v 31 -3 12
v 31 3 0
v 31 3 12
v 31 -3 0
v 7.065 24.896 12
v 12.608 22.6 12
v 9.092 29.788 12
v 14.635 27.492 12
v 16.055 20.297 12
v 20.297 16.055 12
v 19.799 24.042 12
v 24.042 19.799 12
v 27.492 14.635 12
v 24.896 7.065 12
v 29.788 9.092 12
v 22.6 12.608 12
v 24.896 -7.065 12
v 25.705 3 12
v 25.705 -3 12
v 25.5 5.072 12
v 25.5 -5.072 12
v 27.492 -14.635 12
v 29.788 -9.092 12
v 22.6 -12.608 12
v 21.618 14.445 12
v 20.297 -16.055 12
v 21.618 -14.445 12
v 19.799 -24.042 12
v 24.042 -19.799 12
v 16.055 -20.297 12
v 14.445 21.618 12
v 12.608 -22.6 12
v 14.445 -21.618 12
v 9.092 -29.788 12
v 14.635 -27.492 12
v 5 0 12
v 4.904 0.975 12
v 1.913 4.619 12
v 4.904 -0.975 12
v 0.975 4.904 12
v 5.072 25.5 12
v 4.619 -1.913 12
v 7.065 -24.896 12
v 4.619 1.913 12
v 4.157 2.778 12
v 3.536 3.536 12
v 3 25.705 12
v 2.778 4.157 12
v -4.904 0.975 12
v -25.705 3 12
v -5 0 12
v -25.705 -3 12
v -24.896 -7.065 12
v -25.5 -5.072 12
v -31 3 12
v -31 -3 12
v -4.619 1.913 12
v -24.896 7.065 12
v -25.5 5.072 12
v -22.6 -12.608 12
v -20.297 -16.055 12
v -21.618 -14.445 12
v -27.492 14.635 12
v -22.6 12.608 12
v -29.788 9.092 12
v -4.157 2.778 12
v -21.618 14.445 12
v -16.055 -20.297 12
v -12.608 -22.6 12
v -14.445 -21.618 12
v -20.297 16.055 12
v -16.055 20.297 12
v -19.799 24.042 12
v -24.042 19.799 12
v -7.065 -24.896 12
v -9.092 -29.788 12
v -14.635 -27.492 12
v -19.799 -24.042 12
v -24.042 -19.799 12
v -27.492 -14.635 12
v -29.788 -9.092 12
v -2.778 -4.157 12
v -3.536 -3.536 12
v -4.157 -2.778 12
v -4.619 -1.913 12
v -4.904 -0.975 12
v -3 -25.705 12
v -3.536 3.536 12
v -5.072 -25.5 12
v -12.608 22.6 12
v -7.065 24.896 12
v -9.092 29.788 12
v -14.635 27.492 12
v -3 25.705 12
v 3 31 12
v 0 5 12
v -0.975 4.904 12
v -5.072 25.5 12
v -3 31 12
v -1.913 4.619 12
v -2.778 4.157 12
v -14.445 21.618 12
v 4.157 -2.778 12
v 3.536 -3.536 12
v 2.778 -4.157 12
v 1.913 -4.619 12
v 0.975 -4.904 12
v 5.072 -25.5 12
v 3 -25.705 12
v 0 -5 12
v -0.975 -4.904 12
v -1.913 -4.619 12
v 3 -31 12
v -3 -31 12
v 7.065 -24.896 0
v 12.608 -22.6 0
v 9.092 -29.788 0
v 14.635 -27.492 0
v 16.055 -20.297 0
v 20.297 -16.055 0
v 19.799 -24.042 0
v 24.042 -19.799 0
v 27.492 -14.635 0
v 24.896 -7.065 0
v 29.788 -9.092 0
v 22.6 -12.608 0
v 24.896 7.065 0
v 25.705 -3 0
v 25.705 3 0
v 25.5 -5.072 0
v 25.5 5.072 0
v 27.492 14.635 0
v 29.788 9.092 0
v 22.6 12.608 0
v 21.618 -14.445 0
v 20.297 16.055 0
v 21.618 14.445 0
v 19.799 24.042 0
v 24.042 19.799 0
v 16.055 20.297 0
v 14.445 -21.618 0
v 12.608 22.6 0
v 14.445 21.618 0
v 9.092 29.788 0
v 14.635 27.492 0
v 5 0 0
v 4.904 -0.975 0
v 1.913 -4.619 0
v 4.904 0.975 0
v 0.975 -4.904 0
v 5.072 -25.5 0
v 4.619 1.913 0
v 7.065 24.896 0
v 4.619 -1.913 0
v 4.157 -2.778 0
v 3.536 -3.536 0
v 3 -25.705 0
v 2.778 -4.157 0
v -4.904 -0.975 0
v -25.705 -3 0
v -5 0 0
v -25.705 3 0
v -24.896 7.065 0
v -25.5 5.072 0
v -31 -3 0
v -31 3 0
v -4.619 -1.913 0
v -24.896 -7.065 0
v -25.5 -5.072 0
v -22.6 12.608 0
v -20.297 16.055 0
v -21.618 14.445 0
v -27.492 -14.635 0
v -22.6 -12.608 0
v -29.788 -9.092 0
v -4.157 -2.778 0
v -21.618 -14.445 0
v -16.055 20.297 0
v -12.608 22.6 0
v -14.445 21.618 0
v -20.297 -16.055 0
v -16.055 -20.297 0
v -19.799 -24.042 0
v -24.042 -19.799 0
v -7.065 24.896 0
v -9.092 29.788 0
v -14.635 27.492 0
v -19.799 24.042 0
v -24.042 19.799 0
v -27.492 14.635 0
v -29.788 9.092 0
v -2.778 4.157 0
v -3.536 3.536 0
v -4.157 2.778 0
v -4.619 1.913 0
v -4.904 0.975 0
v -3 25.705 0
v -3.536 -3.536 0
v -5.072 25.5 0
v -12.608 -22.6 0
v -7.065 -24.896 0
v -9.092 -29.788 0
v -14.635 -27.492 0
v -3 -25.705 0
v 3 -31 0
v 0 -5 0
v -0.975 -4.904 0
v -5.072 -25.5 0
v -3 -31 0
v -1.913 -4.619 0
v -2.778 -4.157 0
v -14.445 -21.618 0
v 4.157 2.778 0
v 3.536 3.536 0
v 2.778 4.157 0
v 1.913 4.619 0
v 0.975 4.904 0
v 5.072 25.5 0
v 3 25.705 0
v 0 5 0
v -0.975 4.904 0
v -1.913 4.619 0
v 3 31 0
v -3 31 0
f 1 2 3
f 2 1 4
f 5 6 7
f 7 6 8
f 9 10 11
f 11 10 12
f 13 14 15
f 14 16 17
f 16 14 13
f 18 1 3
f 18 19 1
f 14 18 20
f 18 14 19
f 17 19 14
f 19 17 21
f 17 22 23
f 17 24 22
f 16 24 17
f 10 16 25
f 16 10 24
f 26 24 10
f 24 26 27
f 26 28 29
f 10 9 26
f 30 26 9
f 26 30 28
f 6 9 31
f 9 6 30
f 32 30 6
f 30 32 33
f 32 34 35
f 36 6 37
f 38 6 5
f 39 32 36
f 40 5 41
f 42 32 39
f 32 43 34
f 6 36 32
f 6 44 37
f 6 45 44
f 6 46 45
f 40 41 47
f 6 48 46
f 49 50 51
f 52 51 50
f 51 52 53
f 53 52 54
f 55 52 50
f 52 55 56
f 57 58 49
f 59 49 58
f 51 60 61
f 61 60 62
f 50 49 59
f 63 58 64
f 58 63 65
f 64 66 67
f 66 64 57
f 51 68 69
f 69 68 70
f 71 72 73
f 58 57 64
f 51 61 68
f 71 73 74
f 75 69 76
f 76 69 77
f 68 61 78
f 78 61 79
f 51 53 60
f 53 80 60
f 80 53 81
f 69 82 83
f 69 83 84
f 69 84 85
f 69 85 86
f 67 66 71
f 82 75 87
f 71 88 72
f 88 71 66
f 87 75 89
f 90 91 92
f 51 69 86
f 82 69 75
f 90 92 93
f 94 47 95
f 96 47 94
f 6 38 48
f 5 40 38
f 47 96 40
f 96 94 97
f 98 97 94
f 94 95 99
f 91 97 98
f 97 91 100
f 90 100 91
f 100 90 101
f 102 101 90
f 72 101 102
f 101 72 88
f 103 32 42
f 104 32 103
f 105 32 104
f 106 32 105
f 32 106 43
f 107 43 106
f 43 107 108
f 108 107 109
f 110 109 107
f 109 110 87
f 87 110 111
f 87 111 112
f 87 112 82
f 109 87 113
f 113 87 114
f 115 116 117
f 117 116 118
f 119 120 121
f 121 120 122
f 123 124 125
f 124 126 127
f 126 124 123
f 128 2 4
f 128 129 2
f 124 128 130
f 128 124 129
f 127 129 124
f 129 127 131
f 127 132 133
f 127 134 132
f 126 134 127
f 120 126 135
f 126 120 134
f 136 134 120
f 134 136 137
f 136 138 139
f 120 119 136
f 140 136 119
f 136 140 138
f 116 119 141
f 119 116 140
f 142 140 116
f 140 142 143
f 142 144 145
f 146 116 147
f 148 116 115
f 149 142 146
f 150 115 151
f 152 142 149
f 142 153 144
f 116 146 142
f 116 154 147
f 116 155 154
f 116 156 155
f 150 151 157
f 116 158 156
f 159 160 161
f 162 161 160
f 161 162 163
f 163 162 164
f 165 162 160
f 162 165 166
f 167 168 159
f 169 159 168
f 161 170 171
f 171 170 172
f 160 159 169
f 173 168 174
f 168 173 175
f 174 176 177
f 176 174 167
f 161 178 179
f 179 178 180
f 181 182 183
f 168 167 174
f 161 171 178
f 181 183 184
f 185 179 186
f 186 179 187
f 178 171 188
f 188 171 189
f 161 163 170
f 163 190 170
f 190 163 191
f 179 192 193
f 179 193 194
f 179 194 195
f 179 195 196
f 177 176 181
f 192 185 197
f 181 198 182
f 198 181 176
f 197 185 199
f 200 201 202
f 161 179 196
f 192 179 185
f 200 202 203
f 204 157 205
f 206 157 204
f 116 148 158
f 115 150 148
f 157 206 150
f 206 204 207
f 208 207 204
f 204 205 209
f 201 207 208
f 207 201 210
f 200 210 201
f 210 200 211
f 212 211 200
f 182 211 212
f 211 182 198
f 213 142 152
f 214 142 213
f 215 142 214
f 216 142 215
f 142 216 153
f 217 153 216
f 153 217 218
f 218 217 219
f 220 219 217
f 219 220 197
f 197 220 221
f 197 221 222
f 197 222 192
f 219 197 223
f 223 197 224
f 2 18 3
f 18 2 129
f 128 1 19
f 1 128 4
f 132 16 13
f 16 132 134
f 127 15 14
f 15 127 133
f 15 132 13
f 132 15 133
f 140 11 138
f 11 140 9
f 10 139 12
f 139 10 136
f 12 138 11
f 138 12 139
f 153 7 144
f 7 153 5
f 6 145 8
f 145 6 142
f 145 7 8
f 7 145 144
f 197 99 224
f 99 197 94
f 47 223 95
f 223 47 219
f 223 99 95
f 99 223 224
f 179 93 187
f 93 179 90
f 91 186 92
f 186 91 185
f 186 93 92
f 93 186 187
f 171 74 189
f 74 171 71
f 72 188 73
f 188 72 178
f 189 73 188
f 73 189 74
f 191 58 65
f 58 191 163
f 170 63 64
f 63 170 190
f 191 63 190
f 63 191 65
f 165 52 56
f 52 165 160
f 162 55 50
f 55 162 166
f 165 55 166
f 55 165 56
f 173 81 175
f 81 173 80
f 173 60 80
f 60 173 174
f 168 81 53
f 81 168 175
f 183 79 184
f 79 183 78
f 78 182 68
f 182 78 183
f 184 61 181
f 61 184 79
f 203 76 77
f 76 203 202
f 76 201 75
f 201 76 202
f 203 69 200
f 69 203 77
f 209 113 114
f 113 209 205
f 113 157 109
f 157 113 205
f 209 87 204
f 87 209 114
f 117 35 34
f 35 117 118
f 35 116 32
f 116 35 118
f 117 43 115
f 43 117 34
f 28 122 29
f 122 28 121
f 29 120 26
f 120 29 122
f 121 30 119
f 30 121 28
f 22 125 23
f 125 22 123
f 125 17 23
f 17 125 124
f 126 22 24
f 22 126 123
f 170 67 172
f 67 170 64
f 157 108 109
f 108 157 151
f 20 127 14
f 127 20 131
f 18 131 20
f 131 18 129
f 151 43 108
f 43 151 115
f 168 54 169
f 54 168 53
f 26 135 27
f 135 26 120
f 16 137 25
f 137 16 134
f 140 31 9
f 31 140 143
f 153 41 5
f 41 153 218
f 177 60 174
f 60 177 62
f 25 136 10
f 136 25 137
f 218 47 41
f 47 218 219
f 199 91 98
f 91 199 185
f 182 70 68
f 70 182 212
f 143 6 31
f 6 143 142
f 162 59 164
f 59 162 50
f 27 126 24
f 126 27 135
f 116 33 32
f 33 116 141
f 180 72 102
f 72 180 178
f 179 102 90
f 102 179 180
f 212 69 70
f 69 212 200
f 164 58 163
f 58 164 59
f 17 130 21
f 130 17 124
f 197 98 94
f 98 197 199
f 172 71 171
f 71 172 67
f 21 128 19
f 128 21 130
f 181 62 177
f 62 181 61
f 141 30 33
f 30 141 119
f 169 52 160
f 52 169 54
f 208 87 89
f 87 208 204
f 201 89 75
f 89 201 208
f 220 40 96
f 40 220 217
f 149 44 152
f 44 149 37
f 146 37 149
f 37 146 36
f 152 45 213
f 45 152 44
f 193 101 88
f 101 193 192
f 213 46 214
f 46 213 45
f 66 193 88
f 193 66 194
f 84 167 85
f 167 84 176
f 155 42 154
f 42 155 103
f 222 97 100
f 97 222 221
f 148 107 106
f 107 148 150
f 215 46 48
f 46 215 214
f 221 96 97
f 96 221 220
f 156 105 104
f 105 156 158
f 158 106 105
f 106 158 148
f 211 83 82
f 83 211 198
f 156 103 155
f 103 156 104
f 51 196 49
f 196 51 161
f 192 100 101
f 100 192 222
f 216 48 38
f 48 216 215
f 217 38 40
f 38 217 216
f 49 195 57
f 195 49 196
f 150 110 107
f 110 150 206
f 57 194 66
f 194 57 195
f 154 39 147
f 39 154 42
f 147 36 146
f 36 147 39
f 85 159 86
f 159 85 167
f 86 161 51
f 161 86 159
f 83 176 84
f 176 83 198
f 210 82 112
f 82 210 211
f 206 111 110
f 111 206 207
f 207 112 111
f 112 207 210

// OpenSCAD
$fn = 32;

// ----------------------------------------------------------------------
// Spur blank: bored gear blank
// ----------------------------------------------------------------------

// --- parameters (mm) ---
disc_r = 26;              // blank root radius
disc_t = 12;              // blank thickness
n_teeth = 16;             // stub tooth count
tooth_w = 6;              // tooth width at the root
tooth_h = 5;              // tooth height above the root
bore_r = 5;               // central bore radius

out_r = disc_r + tooth_h;  // tip radius
bbox_x = 62.0;  // measured width over the teeth
bbox_y = 62.0;  // measured depth over the teeth

difference() {
union() {
  cylinder(r = disc_r, h = disc_t);
  for (i = [0 : n_teeth - 1])
    rotate([0, 0, i * 360 / n_teeth])
      translate([disc_r - 1, -tooth_w / 2, 0])
        cube([tooth_h + 1, tooth_w, disc_t]);
}
  translate([0, 0, -1]) cylinder(r = bore_r, h = disc_t + 2);
}
